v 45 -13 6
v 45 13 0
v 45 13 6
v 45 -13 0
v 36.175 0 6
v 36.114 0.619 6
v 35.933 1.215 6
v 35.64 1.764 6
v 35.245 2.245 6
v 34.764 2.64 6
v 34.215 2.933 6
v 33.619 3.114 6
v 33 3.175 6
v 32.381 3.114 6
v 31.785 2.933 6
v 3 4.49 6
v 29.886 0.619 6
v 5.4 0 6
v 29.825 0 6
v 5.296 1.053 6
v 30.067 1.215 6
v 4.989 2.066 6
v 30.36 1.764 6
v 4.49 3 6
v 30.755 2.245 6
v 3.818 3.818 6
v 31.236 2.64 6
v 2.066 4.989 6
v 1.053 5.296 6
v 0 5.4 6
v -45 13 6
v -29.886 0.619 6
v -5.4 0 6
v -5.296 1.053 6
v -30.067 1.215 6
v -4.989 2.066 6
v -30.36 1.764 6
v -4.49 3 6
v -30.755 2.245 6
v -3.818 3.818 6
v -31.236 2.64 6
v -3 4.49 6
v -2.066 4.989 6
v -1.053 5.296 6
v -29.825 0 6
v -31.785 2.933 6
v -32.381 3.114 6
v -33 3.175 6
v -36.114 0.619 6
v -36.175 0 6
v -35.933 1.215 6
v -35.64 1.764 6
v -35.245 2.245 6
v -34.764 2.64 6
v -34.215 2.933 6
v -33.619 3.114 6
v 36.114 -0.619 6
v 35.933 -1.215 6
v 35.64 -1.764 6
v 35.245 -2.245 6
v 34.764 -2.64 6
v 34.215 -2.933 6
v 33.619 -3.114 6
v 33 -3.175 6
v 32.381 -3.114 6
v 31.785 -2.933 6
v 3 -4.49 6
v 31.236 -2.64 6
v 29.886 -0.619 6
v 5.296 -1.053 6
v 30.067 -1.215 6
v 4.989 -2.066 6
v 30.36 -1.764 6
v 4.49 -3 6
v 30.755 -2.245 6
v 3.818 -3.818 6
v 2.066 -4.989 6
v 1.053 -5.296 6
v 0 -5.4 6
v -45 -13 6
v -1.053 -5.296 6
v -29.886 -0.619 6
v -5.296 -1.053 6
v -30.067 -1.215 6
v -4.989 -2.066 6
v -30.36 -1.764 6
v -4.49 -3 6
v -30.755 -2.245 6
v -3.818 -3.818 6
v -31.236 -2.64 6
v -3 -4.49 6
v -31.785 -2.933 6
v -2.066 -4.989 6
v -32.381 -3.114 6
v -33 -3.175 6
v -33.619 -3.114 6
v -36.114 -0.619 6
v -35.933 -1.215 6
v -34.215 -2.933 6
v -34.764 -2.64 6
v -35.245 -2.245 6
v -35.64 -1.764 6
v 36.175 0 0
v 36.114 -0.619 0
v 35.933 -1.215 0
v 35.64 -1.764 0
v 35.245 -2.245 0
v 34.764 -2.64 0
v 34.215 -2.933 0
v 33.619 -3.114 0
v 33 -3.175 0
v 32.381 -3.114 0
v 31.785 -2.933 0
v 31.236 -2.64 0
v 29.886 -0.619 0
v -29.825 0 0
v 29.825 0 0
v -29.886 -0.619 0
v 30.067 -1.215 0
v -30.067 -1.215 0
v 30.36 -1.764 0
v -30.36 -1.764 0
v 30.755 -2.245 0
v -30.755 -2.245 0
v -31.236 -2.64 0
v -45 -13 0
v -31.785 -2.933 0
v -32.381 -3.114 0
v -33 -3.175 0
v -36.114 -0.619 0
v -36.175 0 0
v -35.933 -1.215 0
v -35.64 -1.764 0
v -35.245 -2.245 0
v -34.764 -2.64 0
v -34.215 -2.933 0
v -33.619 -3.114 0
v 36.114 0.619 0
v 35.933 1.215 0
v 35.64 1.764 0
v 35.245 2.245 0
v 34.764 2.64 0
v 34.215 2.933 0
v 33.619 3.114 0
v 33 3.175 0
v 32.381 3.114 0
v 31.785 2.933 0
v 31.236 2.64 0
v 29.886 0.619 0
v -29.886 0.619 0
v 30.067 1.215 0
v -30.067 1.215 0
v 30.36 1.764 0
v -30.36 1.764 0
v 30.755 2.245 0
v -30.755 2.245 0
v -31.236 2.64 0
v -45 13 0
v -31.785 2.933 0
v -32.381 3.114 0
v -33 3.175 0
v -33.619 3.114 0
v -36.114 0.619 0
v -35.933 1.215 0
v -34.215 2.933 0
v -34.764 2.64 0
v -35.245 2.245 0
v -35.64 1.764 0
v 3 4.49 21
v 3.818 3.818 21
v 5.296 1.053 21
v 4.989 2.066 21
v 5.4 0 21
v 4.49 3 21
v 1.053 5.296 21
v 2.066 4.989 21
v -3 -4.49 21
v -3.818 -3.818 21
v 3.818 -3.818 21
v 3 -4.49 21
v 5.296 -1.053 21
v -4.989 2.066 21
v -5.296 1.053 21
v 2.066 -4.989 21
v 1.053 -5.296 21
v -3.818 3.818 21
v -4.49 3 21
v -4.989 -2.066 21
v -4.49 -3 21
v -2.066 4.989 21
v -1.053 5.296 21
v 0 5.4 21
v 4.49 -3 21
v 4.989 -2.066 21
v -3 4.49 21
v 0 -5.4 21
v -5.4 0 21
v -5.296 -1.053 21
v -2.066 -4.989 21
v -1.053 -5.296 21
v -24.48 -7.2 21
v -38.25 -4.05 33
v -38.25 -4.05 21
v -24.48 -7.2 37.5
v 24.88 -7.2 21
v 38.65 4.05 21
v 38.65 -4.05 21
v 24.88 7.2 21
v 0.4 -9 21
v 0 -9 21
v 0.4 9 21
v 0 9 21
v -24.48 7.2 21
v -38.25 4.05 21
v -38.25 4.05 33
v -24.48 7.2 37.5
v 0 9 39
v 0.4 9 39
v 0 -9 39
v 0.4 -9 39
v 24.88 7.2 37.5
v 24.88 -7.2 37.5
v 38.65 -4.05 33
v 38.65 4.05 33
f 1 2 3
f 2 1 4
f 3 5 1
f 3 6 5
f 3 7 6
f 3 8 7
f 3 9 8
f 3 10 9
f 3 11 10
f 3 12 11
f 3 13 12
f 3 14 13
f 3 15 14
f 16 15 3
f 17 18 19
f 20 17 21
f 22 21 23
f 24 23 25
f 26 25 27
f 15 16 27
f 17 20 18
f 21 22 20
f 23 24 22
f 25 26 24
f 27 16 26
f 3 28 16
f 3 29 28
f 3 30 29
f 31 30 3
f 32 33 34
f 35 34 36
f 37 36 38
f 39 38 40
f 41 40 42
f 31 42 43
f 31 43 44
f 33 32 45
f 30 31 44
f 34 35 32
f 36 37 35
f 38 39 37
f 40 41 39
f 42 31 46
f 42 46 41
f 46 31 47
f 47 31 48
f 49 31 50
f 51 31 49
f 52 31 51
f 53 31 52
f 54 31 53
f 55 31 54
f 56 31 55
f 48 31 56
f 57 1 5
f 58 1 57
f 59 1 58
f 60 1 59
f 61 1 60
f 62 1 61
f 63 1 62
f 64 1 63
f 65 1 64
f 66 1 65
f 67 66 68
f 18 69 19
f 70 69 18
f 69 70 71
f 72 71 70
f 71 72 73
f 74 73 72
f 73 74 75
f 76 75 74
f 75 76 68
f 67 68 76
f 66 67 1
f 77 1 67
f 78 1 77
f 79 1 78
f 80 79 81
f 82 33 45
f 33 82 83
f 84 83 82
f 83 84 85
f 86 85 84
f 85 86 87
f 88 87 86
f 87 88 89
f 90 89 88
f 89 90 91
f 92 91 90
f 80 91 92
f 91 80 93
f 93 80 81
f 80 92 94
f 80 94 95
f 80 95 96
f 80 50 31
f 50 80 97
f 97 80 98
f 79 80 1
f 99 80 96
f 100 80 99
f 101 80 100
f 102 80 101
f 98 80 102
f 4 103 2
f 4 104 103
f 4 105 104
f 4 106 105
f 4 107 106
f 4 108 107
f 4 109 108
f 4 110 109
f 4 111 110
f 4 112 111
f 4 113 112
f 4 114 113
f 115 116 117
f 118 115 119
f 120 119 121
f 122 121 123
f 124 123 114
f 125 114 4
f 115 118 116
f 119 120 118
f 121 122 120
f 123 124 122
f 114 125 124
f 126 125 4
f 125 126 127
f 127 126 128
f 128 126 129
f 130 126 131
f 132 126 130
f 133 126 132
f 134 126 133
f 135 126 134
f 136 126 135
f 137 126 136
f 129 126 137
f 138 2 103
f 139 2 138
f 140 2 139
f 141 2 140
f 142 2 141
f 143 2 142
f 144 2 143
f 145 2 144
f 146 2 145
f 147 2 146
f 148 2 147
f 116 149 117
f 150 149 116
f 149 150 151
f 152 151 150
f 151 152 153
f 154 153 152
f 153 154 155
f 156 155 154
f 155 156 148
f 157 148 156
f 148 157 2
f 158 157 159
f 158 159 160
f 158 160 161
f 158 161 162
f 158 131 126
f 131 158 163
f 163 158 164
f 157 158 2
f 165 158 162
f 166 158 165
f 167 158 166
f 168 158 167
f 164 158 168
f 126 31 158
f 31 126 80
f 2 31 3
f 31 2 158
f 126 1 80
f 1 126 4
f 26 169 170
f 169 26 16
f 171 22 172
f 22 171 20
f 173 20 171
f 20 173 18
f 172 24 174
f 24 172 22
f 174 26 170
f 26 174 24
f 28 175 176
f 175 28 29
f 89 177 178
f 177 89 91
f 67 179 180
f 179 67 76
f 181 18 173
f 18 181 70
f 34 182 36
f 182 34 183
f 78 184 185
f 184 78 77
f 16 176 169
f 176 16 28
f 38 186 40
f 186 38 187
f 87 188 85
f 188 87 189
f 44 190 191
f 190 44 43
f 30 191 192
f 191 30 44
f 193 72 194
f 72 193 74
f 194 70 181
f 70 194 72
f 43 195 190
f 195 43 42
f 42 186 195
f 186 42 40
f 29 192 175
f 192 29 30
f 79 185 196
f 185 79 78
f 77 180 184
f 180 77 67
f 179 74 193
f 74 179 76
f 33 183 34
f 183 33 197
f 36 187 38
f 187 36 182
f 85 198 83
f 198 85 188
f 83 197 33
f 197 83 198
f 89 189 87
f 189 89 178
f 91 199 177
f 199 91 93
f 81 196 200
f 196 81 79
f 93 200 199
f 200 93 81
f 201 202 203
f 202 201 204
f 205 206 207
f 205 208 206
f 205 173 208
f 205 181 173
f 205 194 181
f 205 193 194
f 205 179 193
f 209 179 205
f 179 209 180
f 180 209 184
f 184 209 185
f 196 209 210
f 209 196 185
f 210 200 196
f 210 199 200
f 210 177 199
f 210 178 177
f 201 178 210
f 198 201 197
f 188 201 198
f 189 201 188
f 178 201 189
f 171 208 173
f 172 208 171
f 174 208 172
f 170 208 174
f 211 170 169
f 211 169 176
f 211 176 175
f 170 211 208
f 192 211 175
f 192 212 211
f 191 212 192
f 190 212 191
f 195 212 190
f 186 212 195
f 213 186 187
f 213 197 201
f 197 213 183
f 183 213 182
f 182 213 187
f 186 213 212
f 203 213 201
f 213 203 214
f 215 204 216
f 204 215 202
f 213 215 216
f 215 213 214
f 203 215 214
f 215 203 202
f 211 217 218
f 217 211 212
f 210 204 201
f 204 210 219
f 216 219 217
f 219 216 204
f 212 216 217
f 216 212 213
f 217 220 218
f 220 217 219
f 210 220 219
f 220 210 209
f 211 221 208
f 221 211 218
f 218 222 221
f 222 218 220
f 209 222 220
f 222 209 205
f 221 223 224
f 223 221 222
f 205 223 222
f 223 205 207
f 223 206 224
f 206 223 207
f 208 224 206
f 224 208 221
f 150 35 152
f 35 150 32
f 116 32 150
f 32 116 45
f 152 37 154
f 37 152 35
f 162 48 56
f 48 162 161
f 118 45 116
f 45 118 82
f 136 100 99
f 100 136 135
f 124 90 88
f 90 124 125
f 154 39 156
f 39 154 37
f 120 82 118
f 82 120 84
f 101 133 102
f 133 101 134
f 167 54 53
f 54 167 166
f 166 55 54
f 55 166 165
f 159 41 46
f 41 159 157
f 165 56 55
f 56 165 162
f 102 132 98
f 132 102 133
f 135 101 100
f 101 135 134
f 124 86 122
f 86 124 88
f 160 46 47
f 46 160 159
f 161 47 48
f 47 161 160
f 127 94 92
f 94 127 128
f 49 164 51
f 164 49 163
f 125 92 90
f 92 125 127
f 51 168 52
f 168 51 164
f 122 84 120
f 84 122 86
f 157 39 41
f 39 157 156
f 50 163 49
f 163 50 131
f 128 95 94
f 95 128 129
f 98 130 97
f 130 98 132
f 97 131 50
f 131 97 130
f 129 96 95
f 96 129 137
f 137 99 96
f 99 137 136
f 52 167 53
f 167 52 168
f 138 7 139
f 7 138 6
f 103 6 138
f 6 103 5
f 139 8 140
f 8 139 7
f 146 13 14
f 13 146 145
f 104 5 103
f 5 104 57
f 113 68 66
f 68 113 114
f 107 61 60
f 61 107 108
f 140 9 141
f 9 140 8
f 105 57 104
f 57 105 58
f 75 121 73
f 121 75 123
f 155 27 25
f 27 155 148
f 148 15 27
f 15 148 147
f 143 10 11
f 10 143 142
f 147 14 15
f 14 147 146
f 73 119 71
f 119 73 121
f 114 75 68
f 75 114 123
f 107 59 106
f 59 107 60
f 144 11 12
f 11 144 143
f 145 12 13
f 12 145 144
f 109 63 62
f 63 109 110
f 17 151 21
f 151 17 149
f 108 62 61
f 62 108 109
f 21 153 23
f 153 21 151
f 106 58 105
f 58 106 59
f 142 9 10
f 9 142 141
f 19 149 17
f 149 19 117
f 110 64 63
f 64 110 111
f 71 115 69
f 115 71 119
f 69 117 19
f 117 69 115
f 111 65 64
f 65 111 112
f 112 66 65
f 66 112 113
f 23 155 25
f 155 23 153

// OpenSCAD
$fn = 32;

// ----------------------------------------------------------------------
// Boat cleat: 90 mm base, horn 30 mm up
// ----------------------------------------------------------------------

// --- parameters (mm) ---
base_l = 90;              // base length
base_w = 26;              // base width
base_t = 6;               // base thickness
horn_len = 76.5;          // horn length
horn_d = 18;              // horn diameter at the middle
horn_z = 30;              // horn axis height
end_drop = 6;             // how far the horn tips drop
post_d = 10.8;            // centre post diameter
holes_d = 6.35;           // fixing holes
hole_x = 33;              // fixing hole spacing

difference() {
  union() {
    translate([-45, -13, 0]) cube([base_l, base_w, base_t]);
    /* centre post, sunk 1 mm into the base */
    translate([0, 0, 5]) cylinder(h = 25, d = post_d);
    /* horn: a hull chain of boxes, full in the middle and lighter at the tips */
    hull() {
      translate([-38.25, -4.05, 21]) cube([0.4, 8.1, 12], center = false);
      translate([-24.48, -7.2, 21]) cube([0.4, 14.4, 16.5], center = false);
    }
    hull() {
      translate([-24.48, -7.2, 21]) cube([0.4, 14.4, 16.5], center = false);
      translate([0, -9, 21]) cube([0.4, 18, 18], center = false);
    }
    hull() {
      translate([0, -9, 21]) cube([0.4, 18, 18], center = false);
      translate([24.48, -7.2, 21]) cube([0.4, 14.4, 16.5], center = false);
    }
    hull() {
      translate([24.48, -7.2, 21]) cube([0.4, 14.4, 16.5], center = false);
      translate([38.25, -4.05, 21]) cube([0.4, 8.1, 12], center = false);
    }
  }
  translate([-33, 0, -2.5]) cylinder(h = base_t + 5, d = holes_d);
  translate([33, 0, -2.5]) cylinder(h = base_t + 5, d = holes_d);
}
